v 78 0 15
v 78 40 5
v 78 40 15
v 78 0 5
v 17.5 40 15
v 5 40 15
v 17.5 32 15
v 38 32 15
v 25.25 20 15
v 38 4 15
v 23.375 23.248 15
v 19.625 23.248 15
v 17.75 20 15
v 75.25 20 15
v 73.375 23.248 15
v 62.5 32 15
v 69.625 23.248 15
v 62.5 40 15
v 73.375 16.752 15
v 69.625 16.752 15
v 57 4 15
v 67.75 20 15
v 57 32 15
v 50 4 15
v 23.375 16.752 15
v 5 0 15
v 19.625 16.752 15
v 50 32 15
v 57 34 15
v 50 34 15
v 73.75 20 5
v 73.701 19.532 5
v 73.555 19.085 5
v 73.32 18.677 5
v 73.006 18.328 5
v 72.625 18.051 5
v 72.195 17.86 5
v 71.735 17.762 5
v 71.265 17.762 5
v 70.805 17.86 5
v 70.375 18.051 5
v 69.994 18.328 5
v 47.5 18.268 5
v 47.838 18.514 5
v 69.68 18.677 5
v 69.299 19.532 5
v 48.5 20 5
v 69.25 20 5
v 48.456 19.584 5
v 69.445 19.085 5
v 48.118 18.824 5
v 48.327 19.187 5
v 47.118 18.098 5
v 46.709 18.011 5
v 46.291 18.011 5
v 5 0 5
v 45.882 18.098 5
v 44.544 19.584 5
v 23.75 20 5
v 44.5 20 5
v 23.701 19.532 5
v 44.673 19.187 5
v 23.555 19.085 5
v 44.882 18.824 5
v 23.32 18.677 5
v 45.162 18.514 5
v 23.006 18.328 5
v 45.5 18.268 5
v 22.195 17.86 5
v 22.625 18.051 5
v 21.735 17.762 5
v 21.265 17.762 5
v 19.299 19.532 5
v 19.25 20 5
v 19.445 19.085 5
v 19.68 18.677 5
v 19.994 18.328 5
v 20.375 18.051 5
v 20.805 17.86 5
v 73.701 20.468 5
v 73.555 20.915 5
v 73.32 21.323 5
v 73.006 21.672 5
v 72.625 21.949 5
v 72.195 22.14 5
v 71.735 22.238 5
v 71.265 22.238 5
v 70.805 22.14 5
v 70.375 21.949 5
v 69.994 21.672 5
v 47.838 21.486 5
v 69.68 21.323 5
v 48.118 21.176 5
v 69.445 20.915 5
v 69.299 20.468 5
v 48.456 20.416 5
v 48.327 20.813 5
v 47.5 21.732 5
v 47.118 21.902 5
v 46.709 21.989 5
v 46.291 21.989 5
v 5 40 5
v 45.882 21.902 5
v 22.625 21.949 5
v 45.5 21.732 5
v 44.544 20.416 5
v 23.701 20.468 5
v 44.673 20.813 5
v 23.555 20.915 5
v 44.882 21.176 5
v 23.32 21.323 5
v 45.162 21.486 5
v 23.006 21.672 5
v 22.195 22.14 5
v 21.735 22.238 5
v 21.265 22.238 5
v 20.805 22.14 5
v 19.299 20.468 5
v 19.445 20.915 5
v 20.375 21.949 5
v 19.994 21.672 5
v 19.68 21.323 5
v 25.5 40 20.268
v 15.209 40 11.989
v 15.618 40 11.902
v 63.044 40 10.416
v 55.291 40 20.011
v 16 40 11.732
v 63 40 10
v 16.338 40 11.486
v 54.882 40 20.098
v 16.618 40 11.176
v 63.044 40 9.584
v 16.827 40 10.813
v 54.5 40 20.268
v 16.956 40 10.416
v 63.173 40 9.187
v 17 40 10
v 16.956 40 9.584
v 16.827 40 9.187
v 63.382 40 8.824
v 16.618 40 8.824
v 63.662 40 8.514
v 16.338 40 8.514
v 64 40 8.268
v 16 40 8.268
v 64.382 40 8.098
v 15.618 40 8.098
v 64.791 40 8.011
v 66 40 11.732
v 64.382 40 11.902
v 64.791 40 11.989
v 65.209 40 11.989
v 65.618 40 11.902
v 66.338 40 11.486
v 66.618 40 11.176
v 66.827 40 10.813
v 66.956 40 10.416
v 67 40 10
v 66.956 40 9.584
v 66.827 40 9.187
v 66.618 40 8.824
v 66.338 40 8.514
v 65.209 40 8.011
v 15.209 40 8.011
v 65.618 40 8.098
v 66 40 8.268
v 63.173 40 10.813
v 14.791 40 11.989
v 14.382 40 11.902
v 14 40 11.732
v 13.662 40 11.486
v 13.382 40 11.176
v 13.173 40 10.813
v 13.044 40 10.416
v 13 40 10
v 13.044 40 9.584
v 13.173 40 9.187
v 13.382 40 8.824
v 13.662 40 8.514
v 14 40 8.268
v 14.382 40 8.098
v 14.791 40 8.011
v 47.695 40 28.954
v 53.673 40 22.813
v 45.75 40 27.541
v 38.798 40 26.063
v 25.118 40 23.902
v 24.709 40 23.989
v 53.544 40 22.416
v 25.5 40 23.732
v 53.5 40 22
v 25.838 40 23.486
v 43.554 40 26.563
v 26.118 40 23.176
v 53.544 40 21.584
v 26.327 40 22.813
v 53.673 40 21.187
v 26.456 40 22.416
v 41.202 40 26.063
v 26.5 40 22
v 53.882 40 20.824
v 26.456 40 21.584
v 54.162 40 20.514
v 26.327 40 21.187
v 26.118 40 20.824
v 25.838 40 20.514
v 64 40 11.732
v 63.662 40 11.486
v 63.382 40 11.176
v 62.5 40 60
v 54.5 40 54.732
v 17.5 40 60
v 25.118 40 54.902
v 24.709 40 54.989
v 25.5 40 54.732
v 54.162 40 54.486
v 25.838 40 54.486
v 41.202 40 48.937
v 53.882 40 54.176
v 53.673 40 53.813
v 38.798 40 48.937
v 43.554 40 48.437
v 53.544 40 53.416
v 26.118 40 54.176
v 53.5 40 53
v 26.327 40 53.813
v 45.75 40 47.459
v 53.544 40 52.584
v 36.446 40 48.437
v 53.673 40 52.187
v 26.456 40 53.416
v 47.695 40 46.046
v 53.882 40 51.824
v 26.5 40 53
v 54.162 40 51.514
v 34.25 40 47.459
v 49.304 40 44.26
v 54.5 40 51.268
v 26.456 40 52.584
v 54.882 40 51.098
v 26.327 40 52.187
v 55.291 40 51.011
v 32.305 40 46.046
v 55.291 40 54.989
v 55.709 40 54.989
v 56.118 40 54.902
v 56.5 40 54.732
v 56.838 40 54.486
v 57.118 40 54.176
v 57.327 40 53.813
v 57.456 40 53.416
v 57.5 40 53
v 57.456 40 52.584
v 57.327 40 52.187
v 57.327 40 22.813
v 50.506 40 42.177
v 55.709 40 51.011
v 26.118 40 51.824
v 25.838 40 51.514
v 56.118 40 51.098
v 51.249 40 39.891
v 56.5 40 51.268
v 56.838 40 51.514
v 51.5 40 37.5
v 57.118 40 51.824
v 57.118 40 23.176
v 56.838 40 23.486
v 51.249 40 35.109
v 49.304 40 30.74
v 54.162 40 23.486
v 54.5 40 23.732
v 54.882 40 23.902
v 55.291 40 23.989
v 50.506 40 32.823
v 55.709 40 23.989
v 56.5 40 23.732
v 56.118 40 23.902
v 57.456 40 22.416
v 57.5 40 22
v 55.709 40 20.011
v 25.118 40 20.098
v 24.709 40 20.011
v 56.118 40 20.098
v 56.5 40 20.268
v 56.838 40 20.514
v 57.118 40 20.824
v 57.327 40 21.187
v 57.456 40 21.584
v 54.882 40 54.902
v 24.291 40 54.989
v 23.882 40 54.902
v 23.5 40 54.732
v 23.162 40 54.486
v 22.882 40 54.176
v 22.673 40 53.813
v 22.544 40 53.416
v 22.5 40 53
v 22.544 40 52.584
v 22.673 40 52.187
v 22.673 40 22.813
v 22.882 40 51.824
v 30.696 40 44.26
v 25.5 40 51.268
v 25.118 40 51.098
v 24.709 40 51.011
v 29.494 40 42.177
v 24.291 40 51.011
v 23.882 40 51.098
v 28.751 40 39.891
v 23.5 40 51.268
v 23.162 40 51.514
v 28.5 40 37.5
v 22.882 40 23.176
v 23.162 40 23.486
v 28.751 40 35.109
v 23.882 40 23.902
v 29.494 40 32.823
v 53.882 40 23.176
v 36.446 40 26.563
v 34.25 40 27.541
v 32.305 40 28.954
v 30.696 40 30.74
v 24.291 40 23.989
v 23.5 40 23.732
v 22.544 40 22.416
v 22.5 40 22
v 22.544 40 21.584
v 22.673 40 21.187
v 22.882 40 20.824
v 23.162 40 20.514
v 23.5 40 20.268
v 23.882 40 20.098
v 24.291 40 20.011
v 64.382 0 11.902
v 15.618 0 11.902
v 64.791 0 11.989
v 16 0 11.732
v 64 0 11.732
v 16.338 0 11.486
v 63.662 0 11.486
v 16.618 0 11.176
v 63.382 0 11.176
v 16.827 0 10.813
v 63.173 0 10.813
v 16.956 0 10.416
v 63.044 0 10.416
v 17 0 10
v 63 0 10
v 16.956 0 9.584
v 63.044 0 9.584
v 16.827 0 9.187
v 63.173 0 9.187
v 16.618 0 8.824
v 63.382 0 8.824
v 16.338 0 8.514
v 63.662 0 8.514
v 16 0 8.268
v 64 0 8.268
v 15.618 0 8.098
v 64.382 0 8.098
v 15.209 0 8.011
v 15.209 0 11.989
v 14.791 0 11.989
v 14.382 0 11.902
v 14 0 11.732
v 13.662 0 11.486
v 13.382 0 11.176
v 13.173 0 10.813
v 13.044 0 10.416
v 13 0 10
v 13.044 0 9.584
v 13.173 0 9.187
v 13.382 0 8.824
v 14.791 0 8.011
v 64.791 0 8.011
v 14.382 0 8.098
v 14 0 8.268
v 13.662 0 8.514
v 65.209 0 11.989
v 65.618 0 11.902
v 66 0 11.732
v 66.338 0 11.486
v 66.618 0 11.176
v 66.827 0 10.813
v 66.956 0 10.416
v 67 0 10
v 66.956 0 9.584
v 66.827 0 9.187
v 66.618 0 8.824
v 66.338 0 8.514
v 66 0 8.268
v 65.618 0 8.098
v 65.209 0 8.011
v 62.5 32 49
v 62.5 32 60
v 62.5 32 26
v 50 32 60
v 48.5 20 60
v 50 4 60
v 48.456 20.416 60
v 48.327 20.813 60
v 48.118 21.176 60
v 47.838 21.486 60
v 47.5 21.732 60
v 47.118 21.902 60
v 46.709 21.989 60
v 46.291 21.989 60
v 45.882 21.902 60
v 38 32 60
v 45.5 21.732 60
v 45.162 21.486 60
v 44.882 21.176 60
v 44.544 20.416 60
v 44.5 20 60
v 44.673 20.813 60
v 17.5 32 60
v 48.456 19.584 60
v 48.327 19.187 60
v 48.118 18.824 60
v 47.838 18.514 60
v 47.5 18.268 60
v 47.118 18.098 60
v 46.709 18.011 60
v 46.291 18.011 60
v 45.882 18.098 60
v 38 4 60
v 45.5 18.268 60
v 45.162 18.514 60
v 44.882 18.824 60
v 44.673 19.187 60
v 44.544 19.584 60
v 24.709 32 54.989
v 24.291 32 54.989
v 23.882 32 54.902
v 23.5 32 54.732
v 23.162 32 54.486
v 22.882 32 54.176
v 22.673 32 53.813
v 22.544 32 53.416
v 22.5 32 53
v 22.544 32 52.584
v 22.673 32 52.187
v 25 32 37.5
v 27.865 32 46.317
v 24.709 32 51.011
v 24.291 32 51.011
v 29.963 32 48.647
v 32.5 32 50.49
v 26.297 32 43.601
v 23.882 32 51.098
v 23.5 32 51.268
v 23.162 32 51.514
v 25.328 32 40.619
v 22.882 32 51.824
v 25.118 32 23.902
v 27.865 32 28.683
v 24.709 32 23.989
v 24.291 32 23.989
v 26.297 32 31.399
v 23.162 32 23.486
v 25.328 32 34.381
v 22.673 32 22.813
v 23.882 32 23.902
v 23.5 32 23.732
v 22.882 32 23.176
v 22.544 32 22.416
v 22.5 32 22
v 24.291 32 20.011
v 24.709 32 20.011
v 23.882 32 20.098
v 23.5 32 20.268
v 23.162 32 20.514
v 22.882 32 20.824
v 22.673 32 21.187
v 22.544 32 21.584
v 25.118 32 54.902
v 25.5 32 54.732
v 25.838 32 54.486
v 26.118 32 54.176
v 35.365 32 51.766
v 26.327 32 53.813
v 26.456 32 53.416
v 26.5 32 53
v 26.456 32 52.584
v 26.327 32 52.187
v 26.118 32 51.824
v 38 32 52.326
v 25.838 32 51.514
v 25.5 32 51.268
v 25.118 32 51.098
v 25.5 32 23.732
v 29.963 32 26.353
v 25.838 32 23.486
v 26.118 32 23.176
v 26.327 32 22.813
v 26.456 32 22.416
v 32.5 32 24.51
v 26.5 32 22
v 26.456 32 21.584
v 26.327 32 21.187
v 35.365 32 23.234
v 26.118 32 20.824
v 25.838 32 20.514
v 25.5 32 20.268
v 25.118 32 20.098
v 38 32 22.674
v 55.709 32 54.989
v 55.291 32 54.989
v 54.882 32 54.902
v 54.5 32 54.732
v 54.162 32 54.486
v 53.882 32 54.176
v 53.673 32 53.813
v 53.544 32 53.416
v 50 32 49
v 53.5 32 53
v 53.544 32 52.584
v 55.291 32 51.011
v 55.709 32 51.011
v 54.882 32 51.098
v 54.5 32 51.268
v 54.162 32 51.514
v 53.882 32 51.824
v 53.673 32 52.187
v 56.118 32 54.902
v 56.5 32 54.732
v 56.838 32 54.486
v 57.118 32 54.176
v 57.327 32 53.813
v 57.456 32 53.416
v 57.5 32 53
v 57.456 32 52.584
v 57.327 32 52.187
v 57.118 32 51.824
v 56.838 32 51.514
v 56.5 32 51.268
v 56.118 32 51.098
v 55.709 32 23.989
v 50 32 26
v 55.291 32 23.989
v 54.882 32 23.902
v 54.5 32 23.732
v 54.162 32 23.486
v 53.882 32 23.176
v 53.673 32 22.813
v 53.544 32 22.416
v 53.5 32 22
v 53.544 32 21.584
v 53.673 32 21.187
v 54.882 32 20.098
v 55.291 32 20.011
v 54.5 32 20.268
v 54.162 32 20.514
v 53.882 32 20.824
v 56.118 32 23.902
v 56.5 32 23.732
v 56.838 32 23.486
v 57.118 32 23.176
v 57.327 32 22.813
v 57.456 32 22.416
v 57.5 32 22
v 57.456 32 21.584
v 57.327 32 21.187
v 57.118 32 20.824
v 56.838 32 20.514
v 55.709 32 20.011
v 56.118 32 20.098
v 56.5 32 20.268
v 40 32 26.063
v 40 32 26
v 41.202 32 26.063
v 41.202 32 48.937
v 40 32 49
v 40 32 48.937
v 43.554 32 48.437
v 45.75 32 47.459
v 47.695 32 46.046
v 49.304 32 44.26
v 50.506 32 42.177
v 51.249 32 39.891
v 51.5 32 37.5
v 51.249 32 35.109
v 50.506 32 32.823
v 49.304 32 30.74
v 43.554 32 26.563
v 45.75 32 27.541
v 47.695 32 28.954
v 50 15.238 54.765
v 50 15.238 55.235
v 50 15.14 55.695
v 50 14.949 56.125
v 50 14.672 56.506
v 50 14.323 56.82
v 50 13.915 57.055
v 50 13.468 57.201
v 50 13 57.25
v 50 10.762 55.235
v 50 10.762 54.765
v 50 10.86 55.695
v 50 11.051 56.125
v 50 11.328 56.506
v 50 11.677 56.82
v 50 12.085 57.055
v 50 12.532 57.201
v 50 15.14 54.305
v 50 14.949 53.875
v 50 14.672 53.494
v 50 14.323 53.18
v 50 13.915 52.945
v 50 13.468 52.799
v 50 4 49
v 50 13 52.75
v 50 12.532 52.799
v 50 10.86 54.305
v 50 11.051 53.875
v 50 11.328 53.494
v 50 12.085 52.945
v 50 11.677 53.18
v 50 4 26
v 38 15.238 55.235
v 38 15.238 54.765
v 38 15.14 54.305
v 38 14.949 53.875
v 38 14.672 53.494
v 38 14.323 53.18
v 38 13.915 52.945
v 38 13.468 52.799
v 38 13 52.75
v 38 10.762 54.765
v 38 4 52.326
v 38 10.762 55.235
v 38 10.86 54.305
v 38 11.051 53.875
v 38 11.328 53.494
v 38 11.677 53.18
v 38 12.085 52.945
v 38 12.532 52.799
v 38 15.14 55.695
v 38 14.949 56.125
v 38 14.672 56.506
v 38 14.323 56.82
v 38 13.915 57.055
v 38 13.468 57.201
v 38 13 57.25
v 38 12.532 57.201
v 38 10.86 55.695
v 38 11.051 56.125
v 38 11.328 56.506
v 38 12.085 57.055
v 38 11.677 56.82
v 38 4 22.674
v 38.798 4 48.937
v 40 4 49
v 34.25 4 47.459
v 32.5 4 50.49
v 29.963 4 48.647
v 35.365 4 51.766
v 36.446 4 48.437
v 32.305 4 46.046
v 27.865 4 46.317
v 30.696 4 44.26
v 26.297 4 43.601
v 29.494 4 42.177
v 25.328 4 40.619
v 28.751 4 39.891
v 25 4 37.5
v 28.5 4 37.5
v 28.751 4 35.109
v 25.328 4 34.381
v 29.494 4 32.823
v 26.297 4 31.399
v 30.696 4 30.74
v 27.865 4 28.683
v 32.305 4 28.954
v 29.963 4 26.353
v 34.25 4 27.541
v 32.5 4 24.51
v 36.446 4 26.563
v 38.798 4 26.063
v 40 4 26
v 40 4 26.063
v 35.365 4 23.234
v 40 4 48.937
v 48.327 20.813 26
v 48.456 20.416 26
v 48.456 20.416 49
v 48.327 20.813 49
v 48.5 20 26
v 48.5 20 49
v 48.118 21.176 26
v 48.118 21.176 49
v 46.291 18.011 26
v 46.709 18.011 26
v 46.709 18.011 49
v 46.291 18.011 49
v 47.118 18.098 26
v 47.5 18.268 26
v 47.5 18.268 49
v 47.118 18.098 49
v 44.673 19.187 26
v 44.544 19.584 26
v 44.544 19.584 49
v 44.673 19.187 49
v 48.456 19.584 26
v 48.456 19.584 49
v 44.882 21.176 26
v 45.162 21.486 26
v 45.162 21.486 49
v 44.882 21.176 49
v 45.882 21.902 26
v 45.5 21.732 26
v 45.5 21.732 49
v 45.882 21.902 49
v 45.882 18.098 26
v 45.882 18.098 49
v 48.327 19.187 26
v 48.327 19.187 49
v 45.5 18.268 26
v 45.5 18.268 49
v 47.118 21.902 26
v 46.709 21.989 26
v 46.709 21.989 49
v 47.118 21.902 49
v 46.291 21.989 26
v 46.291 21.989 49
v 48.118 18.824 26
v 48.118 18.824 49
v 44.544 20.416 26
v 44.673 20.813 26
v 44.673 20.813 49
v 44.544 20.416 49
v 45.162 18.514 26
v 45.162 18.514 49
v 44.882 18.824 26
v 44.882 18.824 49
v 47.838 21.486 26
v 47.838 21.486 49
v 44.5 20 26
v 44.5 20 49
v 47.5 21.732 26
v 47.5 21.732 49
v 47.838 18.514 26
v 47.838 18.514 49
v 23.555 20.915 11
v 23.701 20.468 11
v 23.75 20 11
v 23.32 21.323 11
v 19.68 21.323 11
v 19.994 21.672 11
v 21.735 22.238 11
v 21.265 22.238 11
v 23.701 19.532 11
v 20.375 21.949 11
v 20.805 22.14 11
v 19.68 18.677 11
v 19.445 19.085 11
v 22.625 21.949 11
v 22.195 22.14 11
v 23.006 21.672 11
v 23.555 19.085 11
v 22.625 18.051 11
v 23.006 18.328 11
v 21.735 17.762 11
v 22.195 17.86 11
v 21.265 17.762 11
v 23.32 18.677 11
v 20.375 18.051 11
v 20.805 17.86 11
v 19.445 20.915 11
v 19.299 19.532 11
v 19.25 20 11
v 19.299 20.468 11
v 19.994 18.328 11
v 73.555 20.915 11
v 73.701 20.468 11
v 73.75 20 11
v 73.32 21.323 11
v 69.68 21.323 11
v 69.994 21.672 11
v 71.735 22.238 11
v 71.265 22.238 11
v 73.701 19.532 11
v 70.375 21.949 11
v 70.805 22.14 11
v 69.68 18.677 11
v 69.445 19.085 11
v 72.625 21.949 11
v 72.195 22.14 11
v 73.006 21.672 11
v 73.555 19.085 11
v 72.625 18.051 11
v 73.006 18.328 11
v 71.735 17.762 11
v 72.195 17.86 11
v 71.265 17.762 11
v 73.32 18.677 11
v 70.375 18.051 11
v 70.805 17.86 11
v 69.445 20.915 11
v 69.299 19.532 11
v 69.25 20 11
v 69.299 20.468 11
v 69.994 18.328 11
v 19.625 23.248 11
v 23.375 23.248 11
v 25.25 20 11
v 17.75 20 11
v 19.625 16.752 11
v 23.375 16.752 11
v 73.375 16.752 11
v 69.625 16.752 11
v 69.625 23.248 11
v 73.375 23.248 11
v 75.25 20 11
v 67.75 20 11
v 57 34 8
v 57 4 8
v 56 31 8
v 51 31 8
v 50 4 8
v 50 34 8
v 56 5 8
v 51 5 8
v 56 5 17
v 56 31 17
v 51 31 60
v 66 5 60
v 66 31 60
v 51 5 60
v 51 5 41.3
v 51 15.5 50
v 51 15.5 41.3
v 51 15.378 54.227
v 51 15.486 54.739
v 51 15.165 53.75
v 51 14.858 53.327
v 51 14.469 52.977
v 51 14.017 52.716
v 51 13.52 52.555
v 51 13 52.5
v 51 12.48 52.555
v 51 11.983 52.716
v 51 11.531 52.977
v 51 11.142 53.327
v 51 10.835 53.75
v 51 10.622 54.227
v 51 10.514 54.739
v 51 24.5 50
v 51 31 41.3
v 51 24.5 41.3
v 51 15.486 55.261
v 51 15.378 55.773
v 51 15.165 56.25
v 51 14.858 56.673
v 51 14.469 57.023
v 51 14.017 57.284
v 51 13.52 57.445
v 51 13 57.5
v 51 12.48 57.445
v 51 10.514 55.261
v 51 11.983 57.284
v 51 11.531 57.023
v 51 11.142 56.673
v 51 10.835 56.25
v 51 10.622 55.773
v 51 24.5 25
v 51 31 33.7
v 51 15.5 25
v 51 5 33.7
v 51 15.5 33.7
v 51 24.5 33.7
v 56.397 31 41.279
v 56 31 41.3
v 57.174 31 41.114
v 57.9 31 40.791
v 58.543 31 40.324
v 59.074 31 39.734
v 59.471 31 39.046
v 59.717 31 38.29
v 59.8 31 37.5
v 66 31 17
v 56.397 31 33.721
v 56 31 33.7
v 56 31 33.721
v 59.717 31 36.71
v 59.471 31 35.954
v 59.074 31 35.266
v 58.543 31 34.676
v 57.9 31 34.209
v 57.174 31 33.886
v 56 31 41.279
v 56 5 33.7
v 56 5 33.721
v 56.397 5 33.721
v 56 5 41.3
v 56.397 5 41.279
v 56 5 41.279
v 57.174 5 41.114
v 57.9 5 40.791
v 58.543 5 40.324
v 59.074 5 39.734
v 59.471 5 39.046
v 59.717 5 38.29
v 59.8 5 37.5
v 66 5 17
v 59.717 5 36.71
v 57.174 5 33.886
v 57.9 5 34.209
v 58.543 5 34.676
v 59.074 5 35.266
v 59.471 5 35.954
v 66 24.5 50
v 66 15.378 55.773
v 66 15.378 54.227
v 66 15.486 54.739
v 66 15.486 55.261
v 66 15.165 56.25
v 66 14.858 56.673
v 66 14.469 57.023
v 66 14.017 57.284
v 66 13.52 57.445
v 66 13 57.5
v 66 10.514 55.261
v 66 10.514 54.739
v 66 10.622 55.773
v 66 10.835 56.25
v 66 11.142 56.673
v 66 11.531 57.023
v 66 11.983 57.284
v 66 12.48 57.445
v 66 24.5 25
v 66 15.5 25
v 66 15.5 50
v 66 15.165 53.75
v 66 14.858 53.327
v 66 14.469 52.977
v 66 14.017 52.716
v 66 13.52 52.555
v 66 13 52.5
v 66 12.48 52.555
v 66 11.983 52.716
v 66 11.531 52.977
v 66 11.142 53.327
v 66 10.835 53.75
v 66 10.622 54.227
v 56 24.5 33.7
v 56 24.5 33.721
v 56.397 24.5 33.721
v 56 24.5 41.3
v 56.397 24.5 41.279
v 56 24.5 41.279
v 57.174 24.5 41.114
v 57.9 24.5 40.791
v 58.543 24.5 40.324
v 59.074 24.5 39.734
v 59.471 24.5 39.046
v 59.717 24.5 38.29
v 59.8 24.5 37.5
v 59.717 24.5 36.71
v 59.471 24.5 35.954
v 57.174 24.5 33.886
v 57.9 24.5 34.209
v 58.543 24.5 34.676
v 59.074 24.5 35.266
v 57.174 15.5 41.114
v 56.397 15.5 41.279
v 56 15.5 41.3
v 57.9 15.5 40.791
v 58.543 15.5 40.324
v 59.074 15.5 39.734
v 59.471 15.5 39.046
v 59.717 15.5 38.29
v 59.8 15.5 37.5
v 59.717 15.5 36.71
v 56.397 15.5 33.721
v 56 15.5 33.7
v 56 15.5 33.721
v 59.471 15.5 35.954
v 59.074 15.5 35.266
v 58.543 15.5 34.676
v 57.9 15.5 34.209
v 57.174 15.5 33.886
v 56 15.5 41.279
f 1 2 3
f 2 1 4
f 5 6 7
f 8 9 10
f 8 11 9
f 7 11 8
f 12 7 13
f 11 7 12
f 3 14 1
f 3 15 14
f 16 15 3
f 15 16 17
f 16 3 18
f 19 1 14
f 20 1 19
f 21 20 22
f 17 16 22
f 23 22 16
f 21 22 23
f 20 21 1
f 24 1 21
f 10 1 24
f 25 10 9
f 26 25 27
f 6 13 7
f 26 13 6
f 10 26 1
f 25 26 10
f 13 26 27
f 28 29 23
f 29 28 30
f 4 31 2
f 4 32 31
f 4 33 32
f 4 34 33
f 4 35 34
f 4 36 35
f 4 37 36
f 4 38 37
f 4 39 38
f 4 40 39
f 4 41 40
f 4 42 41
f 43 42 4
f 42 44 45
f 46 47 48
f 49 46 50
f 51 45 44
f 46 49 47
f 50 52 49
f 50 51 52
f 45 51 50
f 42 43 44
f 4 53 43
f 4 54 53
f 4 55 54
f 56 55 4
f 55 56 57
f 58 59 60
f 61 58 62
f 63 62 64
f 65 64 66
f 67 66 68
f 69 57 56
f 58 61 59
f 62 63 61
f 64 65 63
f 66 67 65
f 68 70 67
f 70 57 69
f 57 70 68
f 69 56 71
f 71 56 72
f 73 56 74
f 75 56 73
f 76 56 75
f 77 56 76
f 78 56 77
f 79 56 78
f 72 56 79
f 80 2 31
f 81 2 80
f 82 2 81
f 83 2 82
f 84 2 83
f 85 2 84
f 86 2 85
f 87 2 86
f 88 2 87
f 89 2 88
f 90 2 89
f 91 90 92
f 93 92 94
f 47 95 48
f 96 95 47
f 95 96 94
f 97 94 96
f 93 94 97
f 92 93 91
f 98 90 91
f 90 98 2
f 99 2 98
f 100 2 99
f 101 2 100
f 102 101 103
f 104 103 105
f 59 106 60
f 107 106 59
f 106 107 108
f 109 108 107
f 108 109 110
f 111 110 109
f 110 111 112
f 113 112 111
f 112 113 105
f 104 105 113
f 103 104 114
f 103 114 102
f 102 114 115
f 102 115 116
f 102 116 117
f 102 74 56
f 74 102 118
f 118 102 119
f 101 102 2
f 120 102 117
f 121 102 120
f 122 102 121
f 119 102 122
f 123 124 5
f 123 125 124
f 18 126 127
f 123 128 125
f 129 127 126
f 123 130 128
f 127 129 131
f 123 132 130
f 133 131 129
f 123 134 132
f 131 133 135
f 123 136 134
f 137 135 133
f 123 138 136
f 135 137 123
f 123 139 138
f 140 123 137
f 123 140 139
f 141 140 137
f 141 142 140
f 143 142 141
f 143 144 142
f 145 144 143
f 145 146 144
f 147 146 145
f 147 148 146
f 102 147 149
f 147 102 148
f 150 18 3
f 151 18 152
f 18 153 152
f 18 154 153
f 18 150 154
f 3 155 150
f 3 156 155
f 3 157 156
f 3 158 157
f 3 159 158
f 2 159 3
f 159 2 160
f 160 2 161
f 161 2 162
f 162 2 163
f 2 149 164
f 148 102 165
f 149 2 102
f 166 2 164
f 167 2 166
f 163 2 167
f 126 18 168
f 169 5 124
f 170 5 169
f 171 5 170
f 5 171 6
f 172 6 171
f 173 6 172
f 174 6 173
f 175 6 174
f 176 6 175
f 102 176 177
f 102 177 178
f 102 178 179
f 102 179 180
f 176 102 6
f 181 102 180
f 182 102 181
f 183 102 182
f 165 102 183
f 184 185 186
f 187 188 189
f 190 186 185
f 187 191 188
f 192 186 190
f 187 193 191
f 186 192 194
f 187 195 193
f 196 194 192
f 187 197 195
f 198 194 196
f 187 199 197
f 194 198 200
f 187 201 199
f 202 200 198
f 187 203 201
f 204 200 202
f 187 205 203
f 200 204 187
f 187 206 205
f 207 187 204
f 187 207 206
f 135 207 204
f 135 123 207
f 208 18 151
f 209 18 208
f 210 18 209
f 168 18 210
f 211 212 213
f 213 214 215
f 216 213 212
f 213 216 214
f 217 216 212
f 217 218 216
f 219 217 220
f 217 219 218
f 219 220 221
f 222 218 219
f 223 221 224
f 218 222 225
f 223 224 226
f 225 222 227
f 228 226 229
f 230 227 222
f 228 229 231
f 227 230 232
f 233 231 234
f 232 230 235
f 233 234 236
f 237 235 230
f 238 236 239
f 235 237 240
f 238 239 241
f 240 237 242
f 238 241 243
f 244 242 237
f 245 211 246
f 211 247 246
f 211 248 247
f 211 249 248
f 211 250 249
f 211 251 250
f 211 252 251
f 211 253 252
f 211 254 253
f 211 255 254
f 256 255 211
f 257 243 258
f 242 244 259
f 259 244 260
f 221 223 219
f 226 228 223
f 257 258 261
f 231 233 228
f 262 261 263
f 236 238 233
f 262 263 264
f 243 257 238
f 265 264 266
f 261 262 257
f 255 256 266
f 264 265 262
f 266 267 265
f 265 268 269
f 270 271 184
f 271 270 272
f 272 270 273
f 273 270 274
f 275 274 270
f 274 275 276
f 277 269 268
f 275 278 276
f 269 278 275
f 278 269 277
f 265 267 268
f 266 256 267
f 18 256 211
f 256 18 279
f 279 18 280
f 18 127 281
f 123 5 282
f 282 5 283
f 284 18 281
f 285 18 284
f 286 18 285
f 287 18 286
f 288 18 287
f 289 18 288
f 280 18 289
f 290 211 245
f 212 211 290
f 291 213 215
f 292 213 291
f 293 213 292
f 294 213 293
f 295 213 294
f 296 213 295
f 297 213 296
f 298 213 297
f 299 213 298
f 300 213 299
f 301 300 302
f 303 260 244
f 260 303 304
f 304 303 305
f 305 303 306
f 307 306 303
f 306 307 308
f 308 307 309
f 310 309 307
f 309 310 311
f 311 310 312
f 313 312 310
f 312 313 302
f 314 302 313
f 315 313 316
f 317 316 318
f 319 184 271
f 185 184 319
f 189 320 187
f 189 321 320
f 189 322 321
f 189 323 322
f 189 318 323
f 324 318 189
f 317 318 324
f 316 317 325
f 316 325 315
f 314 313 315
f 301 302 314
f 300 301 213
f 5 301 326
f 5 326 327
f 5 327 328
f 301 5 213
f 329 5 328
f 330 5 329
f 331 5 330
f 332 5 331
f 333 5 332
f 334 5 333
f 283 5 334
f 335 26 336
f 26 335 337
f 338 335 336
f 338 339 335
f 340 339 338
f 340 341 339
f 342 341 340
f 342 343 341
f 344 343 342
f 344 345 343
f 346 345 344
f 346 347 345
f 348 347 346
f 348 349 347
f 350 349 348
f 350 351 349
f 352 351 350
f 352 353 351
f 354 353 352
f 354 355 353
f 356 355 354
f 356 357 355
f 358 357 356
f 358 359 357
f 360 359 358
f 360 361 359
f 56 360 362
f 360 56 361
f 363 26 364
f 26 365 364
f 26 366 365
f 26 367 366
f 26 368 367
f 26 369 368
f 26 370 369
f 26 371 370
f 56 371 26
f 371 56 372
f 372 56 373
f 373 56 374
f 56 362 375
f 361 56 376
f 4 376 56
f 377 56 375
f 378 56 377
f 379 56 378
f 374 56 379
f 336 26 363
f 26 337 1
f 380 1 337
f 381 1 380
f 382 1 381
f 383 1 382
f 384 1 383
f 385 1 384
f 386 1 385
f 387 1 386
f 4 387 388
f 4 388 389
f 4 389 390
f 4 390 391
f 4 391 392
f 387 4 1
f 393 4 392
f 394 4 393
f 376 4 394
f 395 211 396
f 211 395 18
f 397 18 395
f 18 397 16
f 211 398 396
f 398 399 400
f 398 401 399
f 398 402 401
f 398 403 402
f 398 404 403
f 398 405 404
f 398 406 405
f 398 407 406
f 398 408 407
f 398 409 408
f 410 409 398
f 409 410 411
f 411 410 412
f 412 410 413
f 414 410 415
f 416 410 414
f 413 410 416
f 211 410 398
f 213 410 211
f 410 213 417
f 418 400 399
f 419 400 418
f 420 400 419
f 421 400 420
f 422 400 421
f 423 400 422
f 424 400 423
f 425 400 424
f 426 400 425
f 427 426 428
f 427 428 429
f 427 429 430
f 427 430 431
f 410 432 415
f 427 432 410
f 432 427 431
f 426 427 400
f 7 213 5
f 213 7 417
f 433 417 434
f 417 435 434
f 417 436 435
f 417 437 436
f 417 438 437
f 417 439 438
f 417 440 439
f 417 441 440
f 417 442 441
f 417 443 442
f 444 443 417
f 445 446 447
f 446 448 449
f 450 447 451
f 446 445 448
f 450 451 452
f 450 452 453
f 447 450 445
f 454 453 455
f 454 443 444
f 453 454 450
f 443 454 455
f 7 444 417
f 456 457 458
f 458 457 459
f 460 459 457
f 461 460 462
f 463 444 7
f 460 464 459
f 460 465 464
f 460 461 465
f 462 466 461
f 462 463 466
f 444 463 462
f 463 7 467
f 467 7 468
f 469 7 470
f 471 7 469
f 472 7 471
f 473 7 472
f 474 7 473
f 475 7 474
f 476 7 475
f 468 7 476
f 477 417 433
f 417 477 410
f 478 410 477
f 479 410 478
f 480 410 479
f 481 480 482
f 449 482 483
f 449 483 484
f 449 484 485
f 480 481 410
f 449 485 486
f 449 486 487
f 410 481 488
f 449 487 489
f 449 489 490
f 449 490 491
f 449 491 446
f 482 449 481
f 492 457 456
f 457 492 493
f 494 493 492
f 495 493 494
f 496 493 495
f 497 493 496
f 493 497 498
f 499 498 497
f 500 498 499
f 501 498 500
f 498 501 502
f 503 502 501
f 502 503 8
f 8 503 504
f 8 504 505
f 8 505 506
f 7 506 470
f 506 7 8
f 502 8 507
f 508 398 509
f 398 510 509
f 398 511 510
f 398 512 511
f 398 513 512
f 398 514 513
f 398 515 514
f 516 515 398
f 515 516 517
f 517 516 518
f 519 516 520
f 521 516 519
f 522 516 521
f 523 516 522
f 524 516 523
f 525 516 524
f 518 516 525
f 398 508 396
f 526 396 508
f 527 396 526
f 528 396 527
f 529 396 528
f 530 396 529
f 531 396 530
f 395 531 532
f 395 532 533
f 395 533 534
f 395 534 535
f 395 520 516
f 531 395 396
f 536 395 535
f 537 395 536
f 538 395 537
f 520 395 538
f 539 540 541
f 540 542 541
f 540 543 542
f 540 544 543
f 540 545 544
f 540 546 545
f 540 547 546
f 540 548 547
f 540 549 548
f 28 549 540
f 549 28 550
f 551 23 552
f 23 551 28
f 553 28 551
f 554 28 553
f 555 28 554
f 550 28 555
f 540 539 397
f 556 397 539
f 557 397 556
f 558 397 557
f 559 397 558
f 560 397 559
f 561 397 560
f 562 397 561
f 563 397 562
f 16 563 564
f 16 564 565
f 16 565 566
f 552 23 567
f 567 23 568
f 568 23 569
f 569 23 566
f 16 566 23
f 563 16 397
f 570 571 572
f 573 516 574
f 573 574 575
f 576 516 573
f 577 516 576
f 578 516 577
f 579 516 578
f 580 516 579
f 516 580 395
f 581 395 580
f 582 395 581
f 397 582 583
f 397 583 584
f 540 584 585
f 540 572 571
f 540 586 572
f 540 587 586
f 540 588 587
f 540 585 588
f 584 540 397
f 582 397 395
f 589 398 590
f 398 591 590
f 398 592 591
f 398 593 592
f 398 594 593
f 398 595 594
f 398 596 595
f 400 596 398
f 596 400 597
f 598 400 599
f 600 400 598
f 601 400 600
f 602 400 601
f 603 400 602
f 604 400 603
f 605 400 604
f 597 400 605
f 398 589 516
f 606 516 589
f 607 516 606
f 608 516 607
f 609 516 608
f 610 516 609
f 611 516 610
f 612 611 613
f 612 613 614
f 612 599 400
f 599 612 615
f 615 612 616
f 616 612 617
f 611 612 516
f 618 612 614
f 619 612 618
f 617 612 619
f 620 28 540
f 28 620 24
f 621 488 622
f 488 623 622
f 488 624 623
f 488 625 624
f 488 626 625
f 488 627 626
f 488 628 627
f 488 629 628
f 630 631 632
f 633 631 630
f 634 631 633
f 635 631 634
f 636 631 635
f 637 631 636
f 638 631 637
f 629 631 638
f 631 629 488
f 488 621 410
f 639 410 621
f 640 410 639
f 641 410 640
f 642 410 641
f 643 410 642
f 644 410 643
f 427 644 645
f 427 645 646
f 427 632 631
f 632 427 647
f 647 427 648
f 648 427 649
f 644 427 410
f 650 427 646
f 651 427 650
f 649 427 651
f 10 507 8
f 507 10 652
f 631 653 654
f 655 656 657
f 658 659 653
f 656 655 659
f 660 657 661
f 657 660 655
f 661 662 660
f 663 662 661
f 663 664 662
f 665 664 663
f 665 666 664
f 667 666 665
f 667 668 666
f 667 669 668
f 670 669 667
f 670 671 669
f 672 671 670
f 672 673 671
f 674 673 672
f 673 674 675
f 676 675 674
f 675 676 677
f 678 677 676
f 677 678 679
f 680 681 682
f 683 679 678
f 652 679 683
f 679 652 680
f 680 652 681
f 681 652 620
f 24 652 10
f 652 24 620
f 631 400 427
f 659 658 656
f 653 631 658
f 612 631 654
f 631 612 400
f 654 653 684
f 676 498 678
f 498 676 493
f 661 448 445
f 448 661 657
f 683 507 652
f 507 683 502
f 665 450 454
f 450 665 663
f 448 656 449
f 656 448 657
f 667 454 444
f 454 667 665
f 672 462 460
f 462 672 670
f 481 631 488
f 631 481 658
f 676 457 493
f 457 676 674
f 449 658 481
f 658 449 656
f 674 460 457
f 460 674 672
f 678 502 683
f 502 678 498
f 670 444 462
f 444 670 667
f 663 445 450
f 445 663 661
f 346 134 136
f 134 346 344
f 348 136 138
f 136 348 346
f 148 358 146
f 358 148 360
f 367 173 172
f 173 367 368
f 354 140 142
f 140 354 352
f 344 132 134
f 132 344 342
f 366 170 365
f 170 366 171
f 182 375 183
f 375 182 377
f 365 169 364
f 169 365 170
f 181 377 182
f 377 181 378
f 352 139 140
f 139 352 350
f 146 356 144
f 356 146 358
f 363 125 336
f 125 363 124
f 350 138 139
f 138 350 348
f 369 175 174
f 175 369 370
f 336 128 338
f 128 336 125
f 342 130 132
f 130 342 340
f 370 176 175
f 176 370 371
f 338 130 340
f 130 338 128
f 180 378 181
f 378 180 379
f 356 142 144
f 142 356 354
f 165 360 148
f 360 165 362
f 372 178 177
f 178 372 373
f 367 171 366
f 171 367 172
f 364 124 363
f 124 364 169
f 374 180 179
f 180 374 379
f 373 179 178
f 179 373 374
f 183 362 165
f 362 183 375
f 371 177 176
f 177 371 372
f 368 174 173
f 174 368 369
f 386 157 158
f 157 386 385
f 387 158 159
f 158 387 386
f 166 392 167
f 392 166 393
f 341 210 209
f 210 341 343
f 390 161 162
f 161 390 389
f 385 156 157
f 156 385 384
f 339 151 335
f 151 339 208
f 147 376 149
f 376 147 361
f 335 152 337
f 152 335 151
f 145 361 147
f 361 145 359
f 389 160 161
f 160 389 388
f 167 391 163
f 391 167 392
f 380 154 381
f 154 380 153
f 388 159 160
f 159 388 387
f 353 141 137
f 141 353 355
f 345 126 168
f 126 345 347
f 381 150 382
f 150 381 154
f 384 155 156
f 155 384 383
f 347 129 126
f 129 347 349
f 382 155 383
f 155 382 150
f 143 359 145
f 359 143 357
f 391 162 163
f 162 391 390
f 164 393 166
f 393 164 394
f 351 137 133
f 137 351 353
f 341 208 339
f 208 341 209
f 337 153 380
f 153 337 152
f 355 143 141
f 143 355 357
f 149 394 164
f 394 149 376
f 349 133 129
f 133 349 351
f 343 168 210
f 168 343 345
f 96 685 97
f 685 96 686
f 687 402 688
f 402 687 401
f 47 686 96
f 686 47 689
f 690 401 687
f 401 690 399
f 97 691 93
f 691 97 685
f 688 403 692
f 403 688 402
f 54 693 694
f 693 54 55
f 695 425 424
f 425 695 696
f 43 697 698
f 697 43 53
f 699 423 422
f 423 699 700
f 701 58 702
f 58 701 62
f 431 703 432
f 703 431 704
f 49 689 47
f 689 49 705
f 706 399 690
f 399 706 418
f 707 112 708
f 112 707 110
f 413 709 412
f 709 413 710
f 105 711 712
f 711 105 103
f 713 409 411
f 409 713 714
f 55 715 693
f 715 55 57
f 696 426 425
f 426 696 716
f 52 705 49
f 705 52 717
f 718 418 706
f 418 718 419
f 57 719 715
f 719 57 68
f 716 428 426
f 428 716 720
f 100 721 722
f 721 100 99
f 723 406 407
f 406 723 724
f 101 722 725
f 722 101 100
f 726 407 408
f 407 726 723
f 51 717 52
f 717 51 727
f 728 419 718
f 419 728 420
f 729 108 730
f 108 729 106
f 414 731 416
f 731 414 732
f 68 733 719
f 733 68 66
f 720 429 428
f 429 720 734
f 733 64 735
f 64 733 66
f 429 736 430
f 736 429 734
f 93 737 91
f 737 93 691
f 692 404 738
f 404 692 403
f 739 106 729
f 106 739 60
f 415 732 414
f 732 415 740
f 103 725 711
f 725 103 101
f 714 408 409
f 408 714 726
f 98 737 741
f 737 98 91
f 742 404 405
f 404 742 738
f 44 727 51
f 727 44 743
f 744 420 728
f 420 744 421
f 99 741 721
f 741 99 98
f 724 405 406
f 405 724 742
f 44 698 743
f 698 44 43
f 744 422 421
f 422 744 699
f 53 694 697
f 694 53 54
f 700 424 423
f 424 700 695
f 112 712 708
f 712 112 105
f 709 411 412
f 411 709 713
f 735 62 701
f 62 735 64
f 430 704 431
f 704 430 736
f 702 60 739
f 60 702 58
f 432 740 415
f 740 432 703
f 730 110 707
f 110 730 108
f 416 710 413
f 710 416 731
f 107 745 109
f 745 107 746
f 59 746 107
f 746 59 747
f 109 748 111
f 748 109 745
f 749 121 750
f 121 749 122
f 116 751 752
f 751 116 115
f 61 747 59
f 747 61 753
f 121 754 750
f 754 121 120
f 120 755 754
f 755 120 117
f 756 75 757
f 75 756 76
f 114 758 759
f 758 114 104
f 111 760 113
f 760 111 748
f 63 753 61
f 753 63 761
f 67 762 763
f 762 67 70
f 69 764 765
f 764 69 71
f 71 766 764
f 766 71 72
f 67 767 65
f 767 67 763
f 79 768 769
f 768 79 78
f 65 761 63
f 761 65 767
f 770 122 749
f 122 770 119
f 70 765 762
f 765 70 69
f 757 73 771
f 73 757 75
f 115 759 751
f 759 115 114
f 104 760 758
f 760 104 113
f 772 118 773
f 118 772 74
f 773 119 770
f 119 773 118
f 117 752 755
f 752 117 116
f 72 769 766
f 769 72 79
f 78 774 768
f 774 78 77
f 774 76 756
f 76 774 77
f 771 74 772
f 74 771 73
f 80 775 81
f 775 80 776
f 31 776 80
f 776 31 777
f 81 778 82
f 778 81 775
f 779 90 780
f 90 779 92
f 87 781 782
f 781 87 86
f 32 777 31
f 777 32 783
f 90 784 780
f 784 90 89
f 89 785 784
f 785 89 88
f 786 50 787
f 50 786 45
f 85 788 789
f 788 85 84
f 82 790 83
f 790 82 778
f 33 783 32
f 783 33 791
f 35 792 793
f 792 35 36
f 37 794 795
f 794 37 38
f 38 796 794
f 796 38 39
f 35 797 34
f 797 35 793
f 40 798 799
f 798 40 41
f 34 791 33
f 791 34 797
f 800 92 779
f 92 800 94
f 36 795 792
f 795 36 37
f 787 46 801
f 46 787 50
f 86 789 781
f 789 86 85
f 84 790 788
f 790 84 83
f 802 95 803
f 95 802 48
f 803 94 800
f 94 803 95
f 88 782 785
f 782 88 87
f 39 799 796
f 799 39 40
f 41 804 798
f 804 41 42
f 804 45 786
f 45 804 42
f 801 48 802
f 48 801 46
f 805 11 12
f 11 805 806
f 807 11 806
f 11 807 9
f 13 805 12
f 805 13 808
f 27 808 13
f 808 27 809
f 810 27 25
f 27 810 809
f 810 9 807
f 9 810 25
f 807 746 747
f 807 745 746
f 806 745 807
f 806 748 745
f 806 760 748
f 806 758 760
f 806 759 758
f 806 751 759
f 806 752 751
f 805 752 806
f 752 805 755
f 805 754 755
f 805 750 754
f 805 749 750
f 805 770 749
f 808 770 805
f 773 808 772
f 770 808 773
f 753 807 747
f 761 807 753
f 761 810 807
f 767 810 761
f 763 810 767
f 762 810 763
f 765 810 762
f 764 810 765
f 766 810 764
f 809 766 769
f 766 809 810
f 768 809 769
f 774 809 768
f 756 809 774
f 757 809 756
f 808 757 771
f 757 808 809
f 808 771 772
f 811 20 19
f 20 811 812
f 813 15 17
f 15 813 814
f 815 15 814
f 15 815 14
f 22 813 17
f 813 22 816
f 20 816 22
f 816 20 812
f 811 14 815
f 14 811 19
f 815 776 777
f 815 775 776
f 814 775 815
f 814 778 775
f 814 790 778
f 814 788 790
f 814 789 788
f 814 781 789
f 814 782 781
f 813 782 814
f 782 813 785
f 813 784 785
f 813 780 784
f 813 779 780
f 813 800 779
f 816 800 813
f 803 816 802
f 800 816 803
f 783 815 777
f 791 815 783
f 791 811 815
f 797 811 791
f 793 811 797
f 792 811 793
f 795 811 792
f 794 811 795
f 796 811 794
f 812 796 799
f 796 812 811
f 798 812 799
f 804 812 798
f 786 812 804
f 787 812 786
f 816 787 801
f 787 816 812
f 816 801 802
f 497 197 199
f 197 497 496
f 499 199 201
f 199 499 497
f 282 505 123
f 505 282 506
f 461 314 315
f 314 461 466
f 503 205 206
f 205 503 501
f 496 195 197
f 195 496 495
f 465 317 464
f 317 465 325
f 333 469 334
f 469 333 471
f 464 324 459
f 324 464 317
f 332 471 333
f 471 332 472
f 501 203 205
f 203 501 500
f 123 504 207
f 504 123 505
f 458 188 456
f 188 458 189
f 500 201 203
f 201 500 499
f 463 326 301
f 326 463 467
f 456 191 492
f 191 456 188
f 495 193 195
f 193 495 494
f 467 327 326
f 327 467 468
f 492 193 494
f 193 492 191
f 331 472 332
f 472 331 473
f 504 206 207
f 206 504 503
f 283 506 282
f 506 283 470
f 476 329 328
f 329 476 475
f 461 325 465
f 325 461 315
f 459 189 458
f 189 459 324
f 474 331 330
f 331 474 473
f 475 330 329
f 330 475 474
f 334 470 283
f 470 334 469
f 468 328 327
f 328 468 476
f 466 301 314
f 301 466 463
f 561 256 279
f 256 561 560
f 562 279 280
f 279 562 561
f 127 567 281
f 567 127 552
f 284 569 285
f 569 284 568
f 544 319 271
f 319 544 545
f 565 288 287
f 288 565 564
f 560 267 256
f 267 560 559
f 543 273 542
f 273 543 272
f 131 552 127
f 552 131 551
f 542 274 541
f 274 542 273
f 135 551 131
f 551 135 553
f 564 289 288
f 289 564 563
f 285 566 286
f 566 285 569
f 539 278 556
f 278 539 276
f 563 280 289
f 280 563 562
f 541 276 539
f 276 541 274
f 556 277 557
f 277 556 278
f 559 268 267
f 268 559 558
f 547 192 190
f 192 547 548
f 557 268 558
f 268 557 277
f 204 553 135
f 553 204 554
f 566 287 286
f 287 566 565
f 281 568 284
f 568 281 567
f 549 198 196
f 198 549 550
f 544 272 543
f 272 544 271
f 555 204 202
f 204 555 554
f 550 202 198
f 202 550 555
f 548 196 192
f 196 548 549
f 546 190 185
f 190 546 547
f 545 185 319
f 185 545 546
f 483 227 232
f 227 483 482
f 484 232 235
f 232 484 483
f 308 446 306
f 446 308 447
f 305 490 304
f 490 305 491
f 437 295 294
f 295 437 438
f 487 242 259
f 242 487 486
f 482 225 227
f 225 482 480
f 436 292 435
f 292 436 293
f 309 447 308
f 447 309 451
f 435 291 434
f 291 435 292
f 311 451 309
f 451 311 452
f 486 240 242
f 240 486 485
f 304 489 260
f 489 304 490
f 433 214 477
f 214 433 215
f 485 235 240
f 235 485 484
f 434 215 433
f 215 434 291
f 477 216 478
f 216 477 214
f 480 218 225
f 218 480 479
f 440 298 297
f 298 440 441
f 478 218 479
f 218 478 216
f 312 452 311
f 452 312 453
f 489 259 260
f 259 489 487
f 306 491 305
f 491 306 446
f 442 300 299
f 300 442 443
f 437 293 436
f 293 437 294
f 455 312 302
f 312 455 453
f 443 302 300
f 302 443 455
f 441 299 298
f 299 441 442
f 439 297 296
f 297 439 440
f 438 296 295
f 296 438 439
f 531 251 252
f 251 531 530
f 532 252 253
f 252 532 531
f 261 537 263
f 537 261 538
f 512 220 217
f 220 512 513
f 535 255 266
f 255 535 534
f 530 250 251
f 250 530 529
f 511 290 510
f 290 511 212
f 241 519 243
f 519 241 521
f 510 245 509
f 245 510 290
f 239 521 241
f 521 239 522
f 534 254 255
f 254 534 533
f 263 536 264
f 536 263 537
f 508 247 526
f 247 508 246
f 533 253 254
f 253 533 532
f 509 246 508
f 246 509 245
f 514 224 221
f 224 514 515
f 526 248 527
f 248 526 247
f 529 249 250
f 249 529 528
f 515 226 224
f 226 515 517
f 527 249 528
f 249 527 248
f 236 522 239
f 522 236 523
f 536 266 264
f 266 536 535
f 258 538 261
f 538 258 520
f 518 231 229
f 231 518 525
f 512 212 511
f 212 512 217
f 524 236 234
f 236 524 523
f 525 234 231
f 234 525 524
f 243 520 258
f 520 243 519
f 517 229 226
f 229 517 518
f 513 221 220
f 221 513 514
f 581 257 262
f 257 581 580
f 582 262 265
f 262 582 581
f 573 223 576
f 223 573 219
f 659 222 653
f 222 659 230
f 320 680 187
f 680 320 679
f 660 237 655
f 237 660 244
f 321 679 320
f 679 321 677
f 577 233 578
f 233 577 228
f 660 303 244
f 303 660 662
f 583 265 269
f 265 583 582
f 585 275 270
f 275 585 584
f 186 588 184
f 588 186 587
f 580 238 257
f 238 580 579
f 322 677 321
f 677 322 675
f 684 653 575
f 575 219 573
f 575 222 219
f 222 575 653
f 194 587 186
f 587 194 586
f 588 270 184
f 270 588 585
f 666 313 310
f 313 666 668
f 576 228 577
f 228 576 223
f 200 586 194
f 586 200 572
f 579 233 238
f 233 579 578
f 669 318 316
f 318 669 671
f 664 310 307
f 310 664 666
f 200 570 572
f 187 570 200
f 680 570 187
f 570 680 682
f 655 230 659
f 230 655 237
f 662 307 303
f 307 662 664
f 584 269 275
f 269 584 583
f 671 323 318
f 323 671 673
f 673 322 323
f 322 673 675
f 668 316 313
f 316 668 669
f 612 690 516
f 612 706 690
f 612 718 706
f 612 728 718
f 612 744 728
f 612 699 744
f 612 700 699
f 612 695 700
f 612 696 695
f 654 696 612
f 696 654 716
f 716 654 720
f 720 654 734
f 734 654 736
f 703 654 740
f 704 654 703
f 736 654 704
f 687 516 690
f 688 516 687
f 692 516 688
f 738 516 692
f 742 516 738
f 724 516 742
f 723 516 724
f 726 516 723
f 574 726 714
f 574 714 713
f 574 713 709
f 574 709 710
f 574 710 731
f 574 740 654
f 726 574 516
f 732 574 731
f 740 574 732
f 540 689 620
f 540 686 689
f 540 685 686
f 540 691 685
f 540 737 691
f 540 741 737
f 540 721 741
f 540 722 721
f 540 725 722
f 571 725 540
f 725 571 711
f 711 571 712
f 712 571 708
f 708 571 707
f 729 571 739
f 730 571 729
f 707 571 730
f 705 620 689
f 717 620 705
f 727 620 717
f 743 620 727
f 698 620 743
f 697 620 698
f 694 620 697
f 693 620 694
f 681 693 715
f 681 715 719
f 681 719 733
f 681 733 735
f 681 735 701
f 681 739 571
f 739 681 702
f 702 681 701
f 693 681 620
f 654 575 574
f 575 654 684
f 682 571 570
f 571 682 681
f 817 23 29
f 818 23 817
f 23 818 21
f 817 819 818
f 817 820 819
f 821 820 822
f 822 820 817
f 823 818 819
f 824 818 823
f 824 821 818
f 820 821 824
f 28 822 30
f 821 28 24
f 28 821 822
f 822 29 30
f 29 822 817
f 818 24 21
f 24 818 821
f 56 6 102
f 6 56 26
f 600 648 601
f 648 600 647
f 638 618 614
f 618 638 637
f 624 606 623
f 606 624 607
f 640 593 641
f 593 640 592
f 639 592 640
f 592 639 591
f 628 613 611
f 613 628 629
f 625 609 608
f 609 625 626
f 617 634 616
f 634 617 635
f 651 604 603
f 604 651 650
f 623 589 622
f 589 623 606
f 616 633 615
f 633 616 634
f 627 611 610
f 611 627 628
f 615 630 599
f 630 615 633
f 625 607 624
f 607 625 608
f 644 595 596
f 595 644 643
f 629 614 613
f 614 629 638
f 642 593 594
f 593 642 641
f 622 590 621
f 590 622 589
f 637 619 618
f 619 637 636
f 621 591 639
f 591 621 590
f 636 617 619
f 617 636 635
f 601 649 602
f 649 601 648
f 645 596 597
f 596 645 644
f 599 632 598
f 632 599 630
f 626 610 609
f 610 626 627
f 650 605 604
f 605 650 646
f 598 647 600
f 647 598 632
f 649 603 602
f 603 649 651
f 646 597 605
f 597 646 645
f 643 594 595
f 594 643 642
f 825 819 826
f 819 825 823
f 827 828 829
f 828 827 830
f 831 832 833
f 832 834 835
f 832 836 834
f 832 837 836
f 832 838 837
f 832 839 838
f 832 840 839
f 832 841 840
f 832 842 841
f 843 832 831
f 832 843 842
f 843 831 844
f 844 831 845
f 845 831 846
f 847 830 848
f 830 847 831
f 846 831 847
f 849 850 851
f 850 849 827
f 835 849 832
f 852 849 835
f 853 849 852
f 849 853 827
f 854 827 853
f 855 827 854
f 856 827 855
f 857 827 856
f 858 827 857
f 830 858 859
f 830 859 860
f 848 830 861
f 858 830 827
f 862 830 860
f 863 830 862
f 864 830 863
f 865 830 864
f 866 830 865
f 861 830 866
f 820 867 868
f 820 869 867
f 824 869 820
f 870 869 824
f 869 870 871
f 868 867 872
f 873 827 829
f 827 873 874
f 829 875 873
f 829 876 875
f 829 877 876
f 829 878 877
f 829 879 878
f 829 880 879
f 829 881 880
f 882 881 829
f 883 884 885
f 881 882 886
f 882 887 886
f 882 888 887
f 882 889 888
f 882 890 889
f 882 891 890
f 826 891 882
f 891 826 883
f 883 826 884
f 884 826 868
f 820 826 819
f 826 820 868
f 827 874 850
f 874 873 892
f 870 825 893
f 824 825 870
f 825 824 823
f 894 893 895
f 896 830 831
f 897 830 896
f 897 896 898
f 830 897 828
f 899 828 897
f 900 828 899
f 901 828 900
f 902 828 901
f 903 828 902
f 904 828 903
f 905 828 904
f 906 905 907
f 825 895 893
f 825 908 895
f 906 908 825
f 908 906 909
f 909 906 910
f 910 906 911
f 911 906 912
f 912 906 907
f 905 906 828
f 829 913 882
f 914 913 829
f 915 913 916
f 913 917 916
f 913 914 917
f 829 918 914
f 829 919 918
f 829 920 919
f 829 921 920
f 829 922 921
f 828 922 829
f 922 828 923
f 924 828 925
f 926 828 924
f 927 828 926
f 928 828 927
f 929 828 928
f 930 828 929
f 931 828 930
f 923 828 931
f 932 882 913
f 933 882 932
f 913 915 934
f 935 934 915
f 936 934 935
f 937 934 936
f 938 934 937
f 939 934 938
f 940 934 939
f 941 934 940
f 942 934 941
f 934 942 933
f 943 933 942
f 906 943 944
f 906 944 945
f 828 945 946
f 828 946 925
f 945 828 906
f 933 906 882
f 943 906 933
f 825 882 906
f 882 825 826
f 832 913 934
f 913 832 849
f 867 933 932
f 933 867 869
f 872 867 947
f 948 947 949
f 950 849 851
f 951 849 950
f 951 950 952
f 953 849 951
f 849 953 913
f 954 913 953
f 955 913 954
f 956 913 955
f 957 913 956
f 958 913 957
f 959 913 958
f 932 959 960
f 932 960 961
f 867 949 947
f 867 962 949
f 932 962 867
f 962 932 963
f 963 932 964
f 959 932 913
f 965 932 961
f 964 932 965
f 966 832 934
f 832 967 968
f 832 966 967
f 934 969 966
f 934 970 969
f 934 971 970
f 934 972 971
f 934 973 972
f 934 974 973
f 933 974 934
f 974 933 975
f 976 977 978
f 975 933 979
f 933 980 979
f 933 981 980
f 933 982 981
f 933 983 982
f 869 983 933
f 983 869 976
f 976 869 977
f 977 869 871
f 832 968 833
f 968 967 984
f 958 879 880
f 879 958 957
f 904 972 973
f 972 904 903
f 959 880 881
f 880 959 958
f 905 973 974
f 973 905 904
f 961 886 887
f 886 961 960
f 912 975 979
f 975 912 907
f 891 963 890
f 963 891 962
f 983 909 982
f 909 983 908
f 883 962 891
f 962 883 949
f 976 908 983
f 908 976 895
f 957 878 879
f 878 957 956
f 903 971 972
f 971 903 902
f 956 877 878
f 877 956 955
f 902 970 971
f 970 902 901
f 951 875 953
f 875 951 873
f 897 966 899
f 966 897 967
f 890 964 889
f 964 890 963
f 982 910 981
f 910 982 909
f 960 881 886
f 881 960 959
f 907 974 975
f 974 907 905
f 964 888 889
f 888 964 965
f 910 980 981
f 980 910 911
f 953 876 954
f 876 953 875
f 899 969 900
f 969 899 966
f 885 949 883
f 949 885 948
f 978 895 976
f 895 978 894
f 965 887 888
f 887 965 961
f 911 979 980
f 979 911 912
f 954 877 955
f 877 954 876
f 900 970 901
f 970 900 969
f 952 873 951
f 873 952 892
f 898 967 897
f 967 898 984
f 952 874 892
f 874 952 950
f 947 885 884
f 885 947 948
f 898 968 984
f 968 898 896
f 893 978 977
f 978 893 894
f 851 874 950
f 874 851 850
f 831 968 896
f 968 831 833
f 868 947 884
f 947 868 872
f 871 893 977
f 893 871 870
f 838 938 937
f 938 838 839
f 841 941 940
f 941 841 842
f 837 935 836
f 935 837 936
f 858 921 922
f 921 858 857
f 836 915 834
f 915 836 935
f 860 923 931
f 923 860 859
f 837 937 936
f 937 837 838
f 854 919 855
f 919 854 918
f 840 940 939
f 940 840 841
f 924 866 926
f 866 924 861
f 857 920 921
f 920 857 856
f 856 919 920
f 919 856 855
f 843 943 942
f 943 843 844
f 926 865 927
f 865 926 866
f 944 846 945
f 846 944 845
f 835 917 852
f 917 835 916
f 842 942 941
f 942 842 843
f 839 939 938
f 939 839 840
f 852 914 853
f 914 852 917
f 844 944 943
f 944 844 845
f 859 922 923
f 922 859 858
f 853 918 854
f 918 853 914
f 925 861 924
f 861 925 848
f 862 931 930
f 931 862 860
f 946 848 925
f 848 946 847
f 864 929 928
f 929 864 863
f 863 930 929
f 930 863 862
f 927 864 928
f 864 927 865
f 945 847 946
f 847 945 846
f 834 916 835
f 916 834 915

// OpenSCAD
//$fn=360;
$fn=30;
module base(){
  difference(){
    // Bloques
    union(){
      // Base
      translate([0,0,5])cube([78,40,10]);
      // Anclaje motor
      translate([17.5,32,15]) cube([45,8,45]);
      // Guia
      translate([38,4,15]) cube([12,28,45]);
      translate([40,18,37.5]) rotate([90,0,0]) cylinder(r=15, h=28, center=true);
    }

    // Agujeros
    union(){
      // Tornillos anclaje a carro
      translate([15,0,7.5+5/2]) rotate([90,0,0]) cylinder(r=2, h=100, center=true);
      translate([65,0,7.5+5/2]) rotate([90,0,0]) cylinder(r=2, h=100, center=true);
      // Filamento
      translate([46.5,20,40]) cylinder(r=2, h=100, center=true);
      // Tornillos fary
      translate([21.5,20,7.5]) cylinder(r=4.5/2, h=50, center=true);
      translate([71.5,20,7.5]) cylinder(r=4.5/2, h=50, center=true);
      // Zocalos tuercas fary
      translate([21.5,20,16]) cylinder(r=7.5/2, h=10, center=true,$fn=6);
      translate([71.5,20,16]) cylinder(r=7.5/2, h=10, center=true,$fn=6);
      // Tornillos motor
      translate([24.5,40,22]) rotate([90,0,0]) cylinder(r=2, h=100, center=true);
      translate([55.5,40,22]) rotate([90,0,0]) cylinder(r=2, h=100, center=true);
      translate([24.5,40,53]) rotate([90,0,0]) cylinder(r=2, h=100, center=true);
      translate([55.5,40,53]) rotate([90,0,0]) cylinder(r=2, h=100, center=true);
      // Eje motor
      translate([40,40,37.5]) rotate([90,0,0]) cylinder(r=11.5, h=100, center=true);
      // Entrada para el idler
      translate([40,0,26]) cube([50,32,23]);
      // Ranura para el idler
      translate([50,4,8]) cube([7,30,7]);
      // Exceso de anchura
      cube([5,45,20]);
      // Tornillo apriete
      translate([50,13,55]) rotate([0,90,0]) cylinder(r=4.5/2, h=1000, center=true);
    }
  }
}

module idler(){
  // Idler
  difference(){
    union(){
      // Pie ranura
      translate([51,5,8]) cube([5,26,52]);
      // Soporte rodamiento
      translate([56,5,17]) cube([10,26,43]);
     
    }
    union(){
      // Zocalo rodamiento
      translate([50,15.5,25]) cube([40,9,25]);
      // Eje rodamiento/
      translate([56,40,37.5]) rotate([90,0,0]) cylinder(r=7.6/2, h=100, center=true);
      translate([48.4,2,33.7]) cube([7.6,30,7.6]);
      // Tornillo apriete
      translate([50,13,55]) rotate([0,90,0]) cylinder(r=2.5, h=1000, center=true);
    }
  }
}

base();
idler();
